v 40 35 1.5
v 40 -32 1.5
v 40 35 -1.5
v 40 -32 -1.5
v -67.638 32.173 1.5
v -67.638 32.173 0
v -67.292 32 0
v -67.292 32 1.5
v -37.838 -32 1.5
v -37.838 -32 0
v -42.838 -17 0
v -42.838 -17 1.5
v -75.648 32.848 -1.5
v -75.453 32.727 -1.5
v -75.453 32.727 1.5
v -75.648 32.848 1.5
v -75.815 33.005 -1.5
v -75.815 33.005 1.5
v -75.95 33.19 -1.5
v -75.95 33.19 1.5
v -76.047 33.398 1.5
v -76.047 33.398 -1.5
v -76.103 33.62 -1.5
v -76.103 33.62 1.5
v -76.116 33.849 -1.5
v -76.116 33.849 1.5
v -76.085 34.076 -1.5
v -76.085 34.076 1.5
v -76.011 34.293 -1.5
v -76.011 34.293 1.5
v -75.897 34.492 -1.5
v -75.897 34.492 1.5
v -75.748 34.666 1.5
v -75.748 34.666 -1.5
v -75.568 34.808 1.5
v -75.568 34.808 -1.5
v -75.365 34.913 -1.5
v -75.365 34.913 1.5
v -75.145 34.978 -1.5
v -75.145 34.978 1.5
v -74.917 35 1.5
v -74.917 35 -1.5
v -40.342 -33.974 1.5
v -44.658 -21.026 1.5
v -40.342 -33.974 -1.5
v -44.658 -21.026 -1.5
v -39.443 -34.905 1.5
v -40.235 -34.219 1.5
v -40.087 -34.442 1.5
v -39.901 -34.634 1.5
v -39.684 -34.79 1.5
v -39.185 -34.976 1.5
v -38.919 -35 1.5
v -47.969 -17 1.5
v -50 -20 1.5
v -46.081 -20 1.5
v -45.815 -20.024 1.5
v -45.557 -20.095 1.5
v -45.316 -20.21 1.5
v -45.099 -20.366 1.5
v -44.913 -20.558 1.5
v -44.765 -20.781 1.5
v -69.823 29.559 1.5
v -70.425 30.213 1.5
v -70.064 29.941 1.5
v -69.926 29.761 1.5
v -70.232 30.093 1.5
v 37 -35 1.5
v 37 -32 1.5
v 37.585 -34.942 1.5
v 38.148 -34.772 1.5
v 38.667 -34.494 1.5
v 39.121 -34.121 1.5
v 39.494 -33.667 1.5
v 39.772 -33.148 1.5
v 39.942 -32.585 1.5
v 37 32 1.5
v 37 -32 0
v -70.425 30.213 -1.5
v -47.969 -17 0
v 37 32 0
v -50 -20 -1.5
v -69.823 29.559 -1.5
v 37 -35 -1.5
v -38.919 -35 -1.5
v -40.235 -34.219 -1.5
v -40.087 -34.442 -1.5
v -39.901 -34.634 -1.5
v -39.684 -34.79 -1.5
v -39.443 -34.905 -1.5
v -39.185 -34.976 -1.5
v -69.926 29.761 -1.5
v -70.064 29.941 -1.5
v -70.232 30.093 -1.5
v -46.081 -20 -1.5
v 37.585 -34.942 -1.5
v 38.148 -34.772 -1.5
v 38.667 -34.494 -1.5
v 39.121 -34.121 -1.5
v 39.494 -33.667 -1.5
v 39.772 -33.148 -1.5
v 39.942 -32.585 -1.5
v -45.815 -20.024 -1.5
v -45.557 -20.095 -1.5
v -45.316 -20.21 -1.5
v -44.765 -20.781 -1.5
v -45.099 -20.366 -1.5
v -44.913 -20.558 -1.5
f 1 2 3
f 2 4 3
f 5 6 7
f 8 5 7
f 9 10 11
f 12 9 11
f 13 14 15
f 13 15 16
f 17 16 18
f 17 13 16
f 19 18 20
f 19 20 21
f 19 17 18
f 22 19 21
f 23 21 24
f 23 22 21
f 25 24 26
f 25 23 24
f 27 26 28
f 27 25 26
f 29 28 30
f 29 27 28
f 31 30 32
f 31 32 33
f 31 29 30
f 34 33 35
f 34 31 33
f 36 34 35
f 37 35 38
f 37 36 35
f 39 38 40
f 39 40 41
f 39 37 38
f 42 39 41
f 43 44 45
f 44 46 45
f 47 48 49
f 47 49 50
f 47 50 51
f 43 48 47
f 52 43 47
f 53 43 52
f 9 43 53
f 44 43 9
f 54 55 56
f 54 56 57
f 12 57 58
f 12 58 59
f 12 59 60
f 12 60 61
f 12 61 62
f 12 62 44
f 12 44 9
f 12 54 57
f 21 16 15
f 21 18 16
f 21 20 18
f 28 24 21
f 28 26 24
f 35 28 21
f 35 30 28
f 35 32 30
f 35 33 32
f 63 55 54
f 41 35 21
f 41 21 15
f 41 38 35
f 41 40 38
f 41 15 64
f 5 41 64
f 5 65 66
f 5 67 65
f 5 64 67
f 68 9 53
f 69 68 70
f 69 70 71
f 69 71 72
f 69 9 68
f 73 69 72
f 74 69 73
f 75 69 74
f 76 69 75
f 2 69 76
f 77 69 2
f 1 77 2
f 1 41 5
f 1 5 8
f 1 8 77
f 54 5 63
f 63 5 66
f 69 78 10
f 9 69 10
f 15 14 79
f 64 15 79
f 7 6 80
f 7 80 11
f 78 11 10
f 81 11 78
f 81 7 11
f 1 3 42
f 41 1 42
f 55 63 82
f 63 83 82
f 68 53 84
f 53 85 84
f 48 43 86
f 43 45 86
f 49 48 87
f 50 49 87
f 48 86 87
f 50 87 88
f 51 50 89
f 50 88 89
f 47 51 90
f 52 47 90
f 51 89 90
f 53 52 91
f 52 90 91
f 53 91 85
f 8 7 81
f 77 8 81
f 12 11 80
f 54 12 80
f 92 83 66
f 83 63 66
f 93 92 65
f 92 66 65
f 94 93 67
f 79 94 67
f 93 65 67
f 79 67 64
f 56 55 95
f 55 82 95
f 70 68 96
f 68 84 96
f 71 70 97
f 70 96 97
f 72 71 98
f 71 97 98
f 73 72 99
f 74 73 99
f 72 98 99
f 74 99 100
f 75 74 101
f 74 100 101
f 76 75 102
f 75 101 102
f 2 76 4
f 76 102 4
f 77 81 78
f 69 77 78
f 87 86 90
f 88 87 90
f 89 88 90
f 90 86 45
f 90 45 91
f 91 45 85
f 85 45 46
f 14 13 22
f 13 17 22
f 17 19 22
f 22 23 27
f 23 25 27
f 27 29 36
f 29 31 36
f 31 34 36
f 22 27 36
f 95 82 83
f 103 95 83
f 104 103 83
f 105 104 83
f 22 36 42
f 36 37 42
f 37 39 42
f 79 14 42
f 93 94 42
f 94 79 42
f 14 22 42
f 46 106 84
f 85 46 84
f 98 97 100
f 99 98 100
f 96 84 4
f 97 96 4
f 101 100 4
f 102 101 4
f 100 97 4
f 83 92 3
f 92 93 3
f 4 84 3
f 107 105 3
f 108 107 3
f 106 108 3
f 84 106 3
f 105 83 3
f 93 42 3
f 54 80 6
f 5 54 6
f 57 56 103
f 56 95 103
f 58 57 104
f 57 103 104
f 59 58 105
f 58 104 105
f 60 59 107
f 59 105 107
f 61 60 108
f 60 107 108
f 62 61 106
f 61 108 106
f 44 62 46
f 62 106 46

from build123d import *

# Parameters (mm, degrees)
F1_DEPTH    = 1.5
F2_DEPTH    = 1.5
F3_T1_DEPTH = 28.416407865
F4_R        = 1.25
F5_R        = 1.5
F6_R        = 3


# Not quite as in the source:
# - a fillet or chamfer that OpenCascade refuses, or shapes differently, is made with other operations: its cross-section is extruded or revolved along the edge and cut away or added
# - a feature names something its author has since deleted; it is built from what else it names


with BuildPart() as f1:
    # F0 (on Top) → F1 (new body)
    with BuildSketch(Plane.XY):
        Polygon((40, -35), (40, 35), (-40, 35), (-80, 35), (-70, 30), (-50, -20), (-45, -20), (-40, -35), align=None)
        Polygon((-37.8377223398, -32), (-42.8377223398, -17), (-47.9689011157, -17), (-67.6381773778, 32.1731906551), (-67.2917960675, 32), (-40, 32), (37, 32), (37, -32), align=None, mode=Mode.SUBTRACT)
        Polygon((-47.9689011157, -17), (-42.8377223398, -17), (-37.8377223398, -32), (37, -32), (37, 32), (-40, 32), (-67.2917960675, 32), (-67.6381773778, 32.1731906551), align=None)
    extrude(amount=-F1_DEPTH)

    # F0 (on Top) → F2 (join)
    with BuildSketch(Plane.XY):
        Polygon((40, -35), (40, 35), (-40, 35), (-80, 35), (-70, 30), (-50, -20), (-45, -20), (-40, -35), align=None)
        Polygon((-37.8377223398, -32), (-42.8377223398, -17), (-47.9689011157, -17), (-67.6381773778, 32.1731906551), (-67.2917960675, 32), (-40, 32), (37, 32), (37, -32), align=None, mode=Mode.SUBTRACT)
    extrude(amount=F2_DEPTH)

    # F3: fillet of radius 1.2 on 1 edges, made by hand

    # F3_s2 → F3_t1 (cut)
    with BuildSketch(Plane.XY.offset(-14.2082039325)):
        with BuildLine():
            ThreePointArc((-75.4533747416, 32.7266873708), (-76.0846172144, 34.0757035047), (-74.916718427, 35))
            Line((-74.916718427, 35), (-80, 35))
            Line((-80, 35), (-75.4533747416, 32.7266873708))
        make_face()
    extrude(amount=F3_T1_DEPTH, mode=Mode.SUBTRACT)

    # F4
    f4_edges = [f1.edges().sort_by_distance(p)[0] for p in [
        (-70, 30, 0),
    ]]
    fillet(f4_edges, radius=F4_R)

    # F5
    f5_edges = [f1.edges().sort_by_distance(p)[0] for p in [
        (-45, -20, 0),
        (-40, -35, 0),
    ]]
    fillet(f5_edges, radius=F5_R)

    # F6
    f6_edges = [f1.edges().sort_by_distance(p)[0] for p in [
        (40, -35, 0),
    ]]
    fillet(f6_edges, radius=F6_R)


solid = f1.part
